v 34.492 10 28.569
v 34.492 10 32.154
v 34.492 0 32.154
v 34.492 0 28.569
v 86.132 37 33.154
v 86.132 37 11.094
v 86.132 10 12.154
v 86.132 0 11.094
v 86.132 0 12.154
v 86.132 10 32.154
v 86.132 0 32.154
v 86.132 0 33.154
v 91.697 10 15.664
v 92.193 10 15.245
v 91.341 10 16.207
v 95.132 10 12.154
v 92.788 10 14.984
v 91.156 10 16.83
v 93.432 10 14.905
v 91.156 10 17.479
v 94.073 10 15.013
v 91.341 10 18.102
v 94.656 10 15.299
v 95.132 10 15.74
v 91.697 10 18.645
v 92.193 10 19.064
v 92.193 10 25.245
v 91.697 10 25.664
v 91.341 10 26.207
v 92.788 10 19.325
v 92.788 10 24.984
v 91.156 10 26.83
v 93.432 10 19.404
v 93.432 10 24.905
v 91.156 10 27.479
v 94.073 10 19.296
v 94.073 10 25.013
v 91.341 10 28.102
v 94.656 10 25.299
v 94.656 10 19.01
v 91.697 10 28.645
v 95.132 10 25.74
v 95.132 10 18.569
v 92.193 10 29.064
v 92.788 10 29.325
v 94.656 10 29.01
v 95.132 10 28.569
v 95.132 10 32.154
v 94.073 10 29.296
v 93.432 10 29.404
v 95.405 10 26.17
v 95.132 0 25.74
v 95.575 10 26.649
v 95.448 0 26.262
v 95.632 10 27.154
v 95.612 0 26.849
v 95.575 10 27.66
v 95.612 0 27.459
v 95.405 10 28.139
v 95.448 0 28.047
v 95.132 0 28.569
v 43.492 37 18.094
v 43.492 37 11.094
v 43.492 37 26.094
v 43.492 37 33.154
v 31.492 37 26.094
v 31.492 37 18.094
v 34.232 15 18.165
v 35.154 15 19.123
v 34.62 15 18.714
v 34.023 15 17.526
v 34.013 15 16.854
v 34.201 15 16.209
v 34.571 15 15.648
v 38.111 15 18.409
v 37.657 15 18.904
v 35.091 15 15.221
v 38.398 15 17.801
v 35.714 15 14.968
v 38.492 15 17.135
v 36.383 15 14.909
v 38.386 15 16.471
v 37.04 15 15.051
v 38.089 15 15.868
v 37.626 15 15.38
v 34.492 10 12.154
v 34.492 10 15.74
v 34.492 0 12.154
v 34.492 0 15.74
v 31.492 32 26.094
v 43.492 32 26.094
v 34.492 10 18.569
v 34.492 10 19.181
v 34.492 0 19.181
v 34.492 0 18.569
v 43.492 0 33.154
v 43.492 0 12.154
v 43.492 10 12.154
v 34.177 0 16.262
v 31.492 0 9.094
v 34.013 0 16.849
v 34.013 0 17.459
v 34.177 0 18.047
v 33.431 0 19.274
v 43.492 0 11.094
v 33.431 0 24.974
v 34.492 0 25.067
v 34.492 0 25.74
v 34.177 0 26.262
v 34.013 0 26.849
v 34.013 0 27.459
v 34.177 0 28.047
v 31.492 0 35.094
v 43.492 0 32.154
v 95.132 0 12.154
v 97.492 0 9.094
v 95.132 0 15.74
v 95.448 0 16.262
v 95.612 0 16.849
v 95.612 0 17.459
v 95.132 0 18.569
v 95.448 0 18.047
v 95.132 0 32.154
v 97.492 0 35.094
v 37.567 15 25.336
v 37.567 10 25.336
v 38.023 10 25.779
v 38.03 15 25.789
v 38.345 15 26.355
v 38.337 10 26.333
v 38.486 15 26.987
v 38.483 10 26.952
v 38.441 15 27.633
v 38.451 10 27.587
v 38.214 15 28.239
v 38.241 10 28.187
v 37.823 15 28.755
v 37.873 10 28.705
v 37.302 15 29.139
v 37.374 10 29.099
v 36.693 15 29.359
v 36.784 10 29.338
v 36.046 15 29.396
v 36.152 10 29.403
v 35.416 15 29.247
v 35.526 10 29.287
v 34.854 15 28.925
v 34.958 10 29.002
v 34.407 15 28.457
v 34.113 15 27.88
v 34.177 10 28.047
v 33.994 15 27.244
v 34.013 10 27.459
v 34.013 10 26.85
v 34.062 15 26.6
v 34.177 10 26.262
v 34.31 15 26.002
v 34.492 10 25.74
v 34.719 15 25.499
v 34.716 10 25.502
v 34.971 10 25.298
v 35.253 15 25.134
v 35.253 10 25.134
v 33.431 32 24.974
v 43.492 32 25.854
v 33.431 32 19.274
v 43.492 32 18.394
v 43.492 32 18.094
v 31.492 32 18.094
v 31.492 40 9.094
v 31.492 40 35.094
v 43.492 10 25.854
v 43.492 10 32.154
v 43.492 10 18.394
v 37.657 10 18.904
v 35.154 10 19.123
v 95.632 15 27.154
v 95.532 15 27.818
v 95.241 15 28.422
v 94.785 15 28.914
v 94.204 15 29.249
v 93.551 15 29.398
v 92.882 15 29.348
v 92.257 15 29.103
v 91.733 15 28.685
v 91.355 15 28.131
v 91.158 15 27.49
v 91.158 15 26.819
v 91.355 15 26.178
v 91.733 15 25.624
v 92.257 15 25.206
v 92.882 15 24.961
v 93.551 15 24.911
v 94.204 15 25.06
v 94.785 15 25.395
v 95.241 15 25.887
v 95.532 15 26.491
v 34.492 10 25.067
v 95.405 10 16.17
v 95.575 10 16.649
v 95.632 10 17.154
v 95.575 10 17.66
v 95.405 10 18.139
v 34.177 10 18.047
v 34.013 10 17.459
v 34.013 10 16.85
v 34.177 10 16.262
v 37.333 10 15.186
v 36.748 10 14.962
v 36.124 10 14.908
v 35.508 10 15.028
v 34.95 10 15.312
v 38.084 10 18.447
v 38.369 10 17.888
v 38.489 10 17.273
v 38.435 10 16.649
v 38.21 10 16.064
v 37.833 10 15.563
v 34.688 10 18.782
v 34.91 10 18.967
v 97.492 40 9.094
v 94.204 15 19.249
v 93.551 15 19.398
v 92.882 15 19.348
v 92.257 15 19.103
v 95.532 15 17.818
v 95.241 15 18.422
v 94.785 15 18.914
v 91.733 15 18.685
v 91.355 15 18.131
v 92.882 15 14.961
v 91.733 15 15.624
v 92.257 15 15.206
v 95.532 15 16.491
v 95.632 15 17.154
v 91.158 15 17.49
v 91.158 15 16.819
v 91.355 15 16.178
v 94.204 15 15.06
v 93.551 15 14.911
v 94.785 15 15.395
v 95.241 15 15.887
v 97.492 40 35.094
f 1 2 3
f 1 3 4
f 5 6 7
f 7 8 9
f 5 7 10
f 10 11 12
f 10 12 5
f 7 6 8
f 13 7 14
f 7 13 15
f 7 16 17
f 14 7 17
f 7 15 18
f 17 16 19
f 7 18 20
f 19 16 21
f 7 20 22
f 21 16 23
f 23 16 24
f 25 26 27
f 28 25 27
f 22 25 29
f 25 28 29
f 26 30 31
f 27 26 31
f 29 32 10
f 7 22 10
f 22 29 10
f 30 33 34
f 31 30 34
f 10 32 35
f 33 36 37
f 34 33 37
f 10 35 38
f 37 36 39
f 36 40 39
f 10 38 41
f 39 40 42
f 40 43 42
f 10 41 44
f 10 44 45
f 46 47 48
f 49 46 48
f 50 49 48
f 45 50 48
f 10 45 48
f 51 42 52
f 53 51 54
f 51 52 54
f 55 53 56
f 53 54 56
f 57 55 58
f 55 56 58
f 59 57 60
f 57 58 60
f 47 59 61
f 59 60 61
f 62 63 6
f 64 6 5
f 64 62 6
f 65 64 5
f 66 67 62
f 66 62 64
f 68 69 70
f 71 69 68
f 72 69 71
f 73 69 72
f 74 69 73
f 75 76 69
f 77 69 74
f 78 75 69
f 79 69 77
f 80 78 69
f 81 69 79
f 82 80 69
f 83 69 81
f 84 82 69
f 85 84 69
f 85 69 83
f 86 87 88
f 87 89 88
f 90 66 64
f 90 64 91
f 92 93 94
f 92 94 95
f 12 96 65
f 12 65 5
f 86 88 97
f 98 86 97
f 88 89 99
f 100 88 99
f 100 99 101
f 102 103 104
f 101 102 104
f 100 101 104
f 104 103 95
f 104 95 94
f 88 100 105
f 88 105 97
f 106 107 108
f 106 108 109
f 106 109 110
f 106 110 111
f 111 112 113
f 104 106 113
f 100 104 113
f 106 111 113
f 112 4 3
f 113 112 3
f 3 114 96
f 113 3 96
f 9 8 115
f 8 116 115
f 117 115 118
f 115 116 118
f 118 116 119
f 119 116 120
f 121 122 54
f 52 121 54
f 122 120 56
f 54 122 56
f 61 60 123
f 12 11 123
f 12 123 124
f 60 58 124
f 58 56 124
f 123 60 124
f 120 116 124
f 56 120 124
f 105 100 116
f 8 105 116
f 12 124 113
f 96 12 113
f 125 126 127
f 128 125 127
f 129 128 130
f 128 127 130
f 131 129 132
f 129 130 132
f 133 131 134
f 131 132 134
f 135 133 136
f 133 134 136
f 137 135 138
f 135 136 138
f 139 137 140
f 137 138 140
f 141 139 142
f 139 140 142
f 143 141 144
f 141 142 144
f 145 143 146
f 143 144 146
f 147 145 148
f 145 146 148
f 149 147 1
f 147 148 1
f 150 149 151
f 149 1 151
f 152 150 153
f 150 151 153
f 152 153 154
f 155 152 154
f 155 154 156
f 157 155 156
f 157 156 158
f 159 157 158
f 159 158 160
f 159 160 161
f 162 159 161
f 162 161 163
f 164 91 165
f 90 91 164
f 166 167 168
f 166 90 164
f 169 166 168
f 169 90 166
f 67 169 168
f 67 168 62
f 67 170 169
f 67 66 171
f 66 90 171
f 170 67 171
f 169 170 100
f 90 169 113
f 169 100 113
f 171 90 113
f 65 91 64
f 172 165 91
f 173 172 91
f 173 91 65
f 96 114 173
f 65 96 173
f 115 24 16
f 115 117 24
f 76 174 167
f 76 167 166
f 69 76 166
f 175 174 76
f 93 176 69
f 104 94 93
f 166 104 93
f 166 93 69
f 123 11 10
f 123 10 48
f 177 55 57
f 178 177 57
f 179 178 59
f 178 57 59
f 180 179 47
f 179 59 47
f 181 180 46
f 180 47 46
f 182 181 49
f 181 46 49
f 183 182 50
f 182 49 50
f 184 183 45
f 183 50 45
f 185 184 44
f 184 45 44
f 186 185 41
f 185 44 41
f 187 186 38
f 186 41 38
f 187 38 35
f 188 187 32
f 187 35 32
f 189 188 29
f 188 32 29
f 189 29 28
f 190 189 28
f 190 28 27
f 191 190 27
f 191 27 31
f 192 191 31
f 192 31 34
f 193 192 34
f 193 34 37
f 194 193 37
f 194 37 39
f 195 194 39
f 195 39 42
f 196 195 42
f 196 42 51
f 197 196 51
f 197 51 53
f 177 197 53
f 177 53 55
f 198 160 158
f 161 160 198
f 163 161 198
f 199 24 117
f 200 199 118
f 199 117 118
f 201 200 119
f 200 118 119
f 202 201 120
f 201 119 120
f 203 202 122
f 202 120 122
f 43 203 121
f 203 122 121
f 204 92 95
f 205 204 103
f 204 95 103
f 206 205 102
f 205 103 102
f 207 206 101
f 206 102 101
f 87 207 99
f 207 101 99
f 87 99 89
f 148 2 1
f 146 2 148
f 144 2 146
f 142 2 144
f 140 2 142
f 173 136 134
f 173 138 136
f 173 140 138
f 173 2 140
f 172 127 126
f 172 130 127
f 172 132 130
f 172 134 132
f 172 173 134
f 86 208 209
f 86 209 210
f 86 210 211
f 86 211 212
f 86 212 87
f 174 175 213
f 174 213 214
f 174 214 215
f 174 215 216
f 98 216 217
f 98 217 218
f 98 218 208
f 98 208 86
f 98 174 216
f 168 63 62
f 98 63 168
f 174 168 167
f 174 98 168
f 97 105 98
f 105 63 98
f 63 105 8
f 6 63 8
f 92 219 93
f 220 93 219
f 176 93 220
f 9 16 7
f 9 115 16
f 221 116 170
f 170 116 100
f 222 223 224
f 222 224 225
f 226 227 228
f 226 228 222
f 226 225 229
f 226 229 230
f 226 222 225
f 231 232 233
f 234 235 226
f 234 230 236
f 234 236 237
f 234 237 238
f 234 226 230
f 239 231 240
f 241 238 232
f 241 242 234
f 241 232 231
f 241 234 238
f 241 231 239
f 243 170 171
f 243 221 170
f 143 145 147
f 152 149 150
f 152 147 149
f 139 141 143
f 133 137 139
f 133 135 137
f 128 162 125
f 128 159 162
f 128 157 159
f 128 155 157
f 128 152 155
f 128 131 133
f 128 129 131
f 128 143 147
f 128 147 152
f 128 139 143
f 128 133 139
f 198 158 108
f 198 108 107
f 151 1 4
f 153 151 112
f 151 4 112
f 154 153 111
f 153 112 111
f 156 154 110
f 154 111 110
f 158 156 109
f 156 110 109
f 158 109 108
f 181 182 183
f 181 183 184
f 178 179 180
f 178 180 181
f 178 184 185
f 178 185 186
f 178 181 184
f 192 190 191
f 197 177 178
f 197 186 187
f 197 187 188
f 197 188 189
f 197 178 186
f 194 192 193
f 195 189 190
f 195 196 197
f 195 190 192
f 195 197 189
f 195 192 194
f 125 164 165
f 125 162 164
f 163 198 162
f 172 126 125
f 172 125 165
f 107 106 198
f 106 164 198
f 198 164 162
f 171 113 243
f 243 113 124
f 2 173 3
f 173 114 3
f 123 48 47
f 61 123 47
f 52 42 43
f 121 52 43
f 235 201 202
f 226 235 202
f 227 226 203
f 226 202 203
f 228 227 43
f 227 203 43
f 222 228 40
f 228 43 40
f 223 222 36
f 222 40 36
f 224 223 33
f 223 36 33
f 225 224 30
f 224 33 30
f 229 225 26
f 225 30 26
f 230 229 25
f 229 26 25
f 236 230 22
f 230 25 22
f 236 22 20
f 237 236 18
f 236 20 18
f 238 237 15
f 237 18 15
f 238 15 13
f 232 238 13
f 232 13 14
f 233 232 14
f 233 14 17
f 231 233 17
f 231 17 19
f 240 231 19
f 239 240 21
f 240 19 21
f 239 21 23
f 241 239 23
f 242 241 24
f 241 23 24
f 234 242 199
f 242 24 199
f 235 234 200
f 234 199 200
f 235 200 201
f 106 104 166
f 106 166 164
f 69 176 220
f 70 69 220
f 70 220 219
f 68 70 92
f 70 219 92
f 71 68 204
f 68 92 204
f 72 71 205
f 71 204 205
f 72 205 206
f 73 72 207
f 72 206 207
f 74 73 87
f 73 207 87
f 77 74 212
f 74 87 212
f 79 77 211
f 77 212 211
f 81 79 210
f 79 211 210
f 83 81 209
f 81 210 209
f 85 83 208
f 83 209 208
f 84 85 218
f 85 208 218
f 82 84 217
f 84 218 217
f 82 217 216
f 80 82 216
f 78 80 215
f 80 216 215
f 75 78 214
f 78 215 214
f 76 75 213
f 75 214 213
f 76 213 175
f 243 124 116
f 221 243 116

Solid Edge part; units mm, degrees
sketch "Sketch1" plane through (0, 0, 0) normal (0, -1, 0) x (1, 0, 0)
  line L0 (31.4924, 35.0939) -> (97.4924, 35.0939)
  line L1 (97.4924, 35.0939) -> (97.4924, 9.0939)
  line L2 (97.4924, 9.0939) -> (31.4924, 9.0939)
  line L3 (31.4924, 9.0939) -> (31.4924, 35.0939)
  dimension "D1" = 66
  dimension "D2" = 26
extrude "Protrusion1" add sketch "Sketch1" against normal blind 40
sketch "Sketch2" plane through (64.4924, 0, 22.0939) normal (0, -1, 0) x (1, 0, 0)
  line L0 (-31.0616, 2.8803) -> (-21, 3.7605)
  line L1 (-21, 3.7605) -> (-21, 11.0605)
  line L2 (-21, 11.0605) -> (21.64, 11.0605)
  line L3 (21.64, -11) -> (21.64, 11.0605)
  line L4 (-21, -11) -> (21.64, -11)
  line L5 (-21, -11) -> (-21, -3.7)
  line L6 (-21, -3.7) -> (-31.0616, -2.8197)
  line L7 (-31.0616, -2.8197) -> (-31.0616, 2.8803)
extrude "ExtrudedCutout_4" cut sketch "Sketch2" against normal blind 37
sketch "Sketch3" plane through (31.4924, 20, 22.0939) normal (-1, 0, 0) x (0, -1, 0)
  line L0 (-17, -4) -> (-17, 4)
  line L1 (-17, 4) -> (-12, 4)
  line L2 (-12, 4) -> (-12, -4)
  line L3 (-12, -4) -> (-17, -4)
  dimension "D1" = 8
  dimension "D2" = 5
  dimension "D3" = 8
  dimension "D4" = 3
  dimension "D5" = 9
extrude "Cutout1" cut sketch "Sketch3" against normal up to next
sketch "Sketch4" plane through (64.4924, 0, 22.0939) normal (0, -1, 0) x (1, 0, 0)
  line L0 (-21, 10.0605) -> (-30, 10.0605)
  line L1 (-30, 10.0605) -> (-30, -9.9395)
  line L2 (-30, -9.9395) -> (-21, -9.9395)
  line L3 (-21, -9.9395) -> (-21, 10.0605)
  line L4 (21.64, 10.0605) -> (30.64, 10.0605)
  line L5 (30.64, 10.0605) -> (30.64, -9.9395)
  line L6 (30.64, -9.9395) -> (21.64, -9.9395)
  line L7 (21.64, -9.9395) -> (21.64, 10.0605)
  dimension "D1" = 1
  dimension "D2" = 20
  dimension "D3" = 1
  dimension "D4" = 9
  dimension "D5" = 20
  dimension "D6" = 9
extrude "ExtrudedCutout_6" cut sketch "Sketch4" against normal blind 10
sketch "Sketch5" plane through (91.2324, 10, 21.645) normal (0, -1, 0) x (1, 0, 0)
  circle A0 centre (2.15, 5.5095) radius 2.25
  circle A1 centre (-54.99, 5.5095) radius 2.25
  circle A2 centre (-54.99, -4.4905) radius 2.25
  circle A3 centre (2.15, -4.4905) radius 2.25
  dimension "D1" = 7.25
  dimension "D2" = 4.5
  dimension "D3" = 7.25
  dimension "D4" = 10
  dimension "D5" = 5
  dimension "D6" = 10
  dimension "D7" = 5
extrude "ExtrudedCutout_7" cut sketch "Sketch5" against normal blind 5
sketch "Sketch6" plane through (64.4924, 0, 22.0939) normal (0, -1, 0) x (1, 0, 0)
  circle A0 centre (28.89, 5.0605) radius 2.25
  circle A1 centre (28.89, -4.9395) radius 2.25
  circle A2 centre (-28.25, 5.0605) radius 2.25
  circle A3 centre (-28.25, -4.9395) radius 2.25
extrude "Cutout2" cut sketch "Sketch6" against normal up to next
